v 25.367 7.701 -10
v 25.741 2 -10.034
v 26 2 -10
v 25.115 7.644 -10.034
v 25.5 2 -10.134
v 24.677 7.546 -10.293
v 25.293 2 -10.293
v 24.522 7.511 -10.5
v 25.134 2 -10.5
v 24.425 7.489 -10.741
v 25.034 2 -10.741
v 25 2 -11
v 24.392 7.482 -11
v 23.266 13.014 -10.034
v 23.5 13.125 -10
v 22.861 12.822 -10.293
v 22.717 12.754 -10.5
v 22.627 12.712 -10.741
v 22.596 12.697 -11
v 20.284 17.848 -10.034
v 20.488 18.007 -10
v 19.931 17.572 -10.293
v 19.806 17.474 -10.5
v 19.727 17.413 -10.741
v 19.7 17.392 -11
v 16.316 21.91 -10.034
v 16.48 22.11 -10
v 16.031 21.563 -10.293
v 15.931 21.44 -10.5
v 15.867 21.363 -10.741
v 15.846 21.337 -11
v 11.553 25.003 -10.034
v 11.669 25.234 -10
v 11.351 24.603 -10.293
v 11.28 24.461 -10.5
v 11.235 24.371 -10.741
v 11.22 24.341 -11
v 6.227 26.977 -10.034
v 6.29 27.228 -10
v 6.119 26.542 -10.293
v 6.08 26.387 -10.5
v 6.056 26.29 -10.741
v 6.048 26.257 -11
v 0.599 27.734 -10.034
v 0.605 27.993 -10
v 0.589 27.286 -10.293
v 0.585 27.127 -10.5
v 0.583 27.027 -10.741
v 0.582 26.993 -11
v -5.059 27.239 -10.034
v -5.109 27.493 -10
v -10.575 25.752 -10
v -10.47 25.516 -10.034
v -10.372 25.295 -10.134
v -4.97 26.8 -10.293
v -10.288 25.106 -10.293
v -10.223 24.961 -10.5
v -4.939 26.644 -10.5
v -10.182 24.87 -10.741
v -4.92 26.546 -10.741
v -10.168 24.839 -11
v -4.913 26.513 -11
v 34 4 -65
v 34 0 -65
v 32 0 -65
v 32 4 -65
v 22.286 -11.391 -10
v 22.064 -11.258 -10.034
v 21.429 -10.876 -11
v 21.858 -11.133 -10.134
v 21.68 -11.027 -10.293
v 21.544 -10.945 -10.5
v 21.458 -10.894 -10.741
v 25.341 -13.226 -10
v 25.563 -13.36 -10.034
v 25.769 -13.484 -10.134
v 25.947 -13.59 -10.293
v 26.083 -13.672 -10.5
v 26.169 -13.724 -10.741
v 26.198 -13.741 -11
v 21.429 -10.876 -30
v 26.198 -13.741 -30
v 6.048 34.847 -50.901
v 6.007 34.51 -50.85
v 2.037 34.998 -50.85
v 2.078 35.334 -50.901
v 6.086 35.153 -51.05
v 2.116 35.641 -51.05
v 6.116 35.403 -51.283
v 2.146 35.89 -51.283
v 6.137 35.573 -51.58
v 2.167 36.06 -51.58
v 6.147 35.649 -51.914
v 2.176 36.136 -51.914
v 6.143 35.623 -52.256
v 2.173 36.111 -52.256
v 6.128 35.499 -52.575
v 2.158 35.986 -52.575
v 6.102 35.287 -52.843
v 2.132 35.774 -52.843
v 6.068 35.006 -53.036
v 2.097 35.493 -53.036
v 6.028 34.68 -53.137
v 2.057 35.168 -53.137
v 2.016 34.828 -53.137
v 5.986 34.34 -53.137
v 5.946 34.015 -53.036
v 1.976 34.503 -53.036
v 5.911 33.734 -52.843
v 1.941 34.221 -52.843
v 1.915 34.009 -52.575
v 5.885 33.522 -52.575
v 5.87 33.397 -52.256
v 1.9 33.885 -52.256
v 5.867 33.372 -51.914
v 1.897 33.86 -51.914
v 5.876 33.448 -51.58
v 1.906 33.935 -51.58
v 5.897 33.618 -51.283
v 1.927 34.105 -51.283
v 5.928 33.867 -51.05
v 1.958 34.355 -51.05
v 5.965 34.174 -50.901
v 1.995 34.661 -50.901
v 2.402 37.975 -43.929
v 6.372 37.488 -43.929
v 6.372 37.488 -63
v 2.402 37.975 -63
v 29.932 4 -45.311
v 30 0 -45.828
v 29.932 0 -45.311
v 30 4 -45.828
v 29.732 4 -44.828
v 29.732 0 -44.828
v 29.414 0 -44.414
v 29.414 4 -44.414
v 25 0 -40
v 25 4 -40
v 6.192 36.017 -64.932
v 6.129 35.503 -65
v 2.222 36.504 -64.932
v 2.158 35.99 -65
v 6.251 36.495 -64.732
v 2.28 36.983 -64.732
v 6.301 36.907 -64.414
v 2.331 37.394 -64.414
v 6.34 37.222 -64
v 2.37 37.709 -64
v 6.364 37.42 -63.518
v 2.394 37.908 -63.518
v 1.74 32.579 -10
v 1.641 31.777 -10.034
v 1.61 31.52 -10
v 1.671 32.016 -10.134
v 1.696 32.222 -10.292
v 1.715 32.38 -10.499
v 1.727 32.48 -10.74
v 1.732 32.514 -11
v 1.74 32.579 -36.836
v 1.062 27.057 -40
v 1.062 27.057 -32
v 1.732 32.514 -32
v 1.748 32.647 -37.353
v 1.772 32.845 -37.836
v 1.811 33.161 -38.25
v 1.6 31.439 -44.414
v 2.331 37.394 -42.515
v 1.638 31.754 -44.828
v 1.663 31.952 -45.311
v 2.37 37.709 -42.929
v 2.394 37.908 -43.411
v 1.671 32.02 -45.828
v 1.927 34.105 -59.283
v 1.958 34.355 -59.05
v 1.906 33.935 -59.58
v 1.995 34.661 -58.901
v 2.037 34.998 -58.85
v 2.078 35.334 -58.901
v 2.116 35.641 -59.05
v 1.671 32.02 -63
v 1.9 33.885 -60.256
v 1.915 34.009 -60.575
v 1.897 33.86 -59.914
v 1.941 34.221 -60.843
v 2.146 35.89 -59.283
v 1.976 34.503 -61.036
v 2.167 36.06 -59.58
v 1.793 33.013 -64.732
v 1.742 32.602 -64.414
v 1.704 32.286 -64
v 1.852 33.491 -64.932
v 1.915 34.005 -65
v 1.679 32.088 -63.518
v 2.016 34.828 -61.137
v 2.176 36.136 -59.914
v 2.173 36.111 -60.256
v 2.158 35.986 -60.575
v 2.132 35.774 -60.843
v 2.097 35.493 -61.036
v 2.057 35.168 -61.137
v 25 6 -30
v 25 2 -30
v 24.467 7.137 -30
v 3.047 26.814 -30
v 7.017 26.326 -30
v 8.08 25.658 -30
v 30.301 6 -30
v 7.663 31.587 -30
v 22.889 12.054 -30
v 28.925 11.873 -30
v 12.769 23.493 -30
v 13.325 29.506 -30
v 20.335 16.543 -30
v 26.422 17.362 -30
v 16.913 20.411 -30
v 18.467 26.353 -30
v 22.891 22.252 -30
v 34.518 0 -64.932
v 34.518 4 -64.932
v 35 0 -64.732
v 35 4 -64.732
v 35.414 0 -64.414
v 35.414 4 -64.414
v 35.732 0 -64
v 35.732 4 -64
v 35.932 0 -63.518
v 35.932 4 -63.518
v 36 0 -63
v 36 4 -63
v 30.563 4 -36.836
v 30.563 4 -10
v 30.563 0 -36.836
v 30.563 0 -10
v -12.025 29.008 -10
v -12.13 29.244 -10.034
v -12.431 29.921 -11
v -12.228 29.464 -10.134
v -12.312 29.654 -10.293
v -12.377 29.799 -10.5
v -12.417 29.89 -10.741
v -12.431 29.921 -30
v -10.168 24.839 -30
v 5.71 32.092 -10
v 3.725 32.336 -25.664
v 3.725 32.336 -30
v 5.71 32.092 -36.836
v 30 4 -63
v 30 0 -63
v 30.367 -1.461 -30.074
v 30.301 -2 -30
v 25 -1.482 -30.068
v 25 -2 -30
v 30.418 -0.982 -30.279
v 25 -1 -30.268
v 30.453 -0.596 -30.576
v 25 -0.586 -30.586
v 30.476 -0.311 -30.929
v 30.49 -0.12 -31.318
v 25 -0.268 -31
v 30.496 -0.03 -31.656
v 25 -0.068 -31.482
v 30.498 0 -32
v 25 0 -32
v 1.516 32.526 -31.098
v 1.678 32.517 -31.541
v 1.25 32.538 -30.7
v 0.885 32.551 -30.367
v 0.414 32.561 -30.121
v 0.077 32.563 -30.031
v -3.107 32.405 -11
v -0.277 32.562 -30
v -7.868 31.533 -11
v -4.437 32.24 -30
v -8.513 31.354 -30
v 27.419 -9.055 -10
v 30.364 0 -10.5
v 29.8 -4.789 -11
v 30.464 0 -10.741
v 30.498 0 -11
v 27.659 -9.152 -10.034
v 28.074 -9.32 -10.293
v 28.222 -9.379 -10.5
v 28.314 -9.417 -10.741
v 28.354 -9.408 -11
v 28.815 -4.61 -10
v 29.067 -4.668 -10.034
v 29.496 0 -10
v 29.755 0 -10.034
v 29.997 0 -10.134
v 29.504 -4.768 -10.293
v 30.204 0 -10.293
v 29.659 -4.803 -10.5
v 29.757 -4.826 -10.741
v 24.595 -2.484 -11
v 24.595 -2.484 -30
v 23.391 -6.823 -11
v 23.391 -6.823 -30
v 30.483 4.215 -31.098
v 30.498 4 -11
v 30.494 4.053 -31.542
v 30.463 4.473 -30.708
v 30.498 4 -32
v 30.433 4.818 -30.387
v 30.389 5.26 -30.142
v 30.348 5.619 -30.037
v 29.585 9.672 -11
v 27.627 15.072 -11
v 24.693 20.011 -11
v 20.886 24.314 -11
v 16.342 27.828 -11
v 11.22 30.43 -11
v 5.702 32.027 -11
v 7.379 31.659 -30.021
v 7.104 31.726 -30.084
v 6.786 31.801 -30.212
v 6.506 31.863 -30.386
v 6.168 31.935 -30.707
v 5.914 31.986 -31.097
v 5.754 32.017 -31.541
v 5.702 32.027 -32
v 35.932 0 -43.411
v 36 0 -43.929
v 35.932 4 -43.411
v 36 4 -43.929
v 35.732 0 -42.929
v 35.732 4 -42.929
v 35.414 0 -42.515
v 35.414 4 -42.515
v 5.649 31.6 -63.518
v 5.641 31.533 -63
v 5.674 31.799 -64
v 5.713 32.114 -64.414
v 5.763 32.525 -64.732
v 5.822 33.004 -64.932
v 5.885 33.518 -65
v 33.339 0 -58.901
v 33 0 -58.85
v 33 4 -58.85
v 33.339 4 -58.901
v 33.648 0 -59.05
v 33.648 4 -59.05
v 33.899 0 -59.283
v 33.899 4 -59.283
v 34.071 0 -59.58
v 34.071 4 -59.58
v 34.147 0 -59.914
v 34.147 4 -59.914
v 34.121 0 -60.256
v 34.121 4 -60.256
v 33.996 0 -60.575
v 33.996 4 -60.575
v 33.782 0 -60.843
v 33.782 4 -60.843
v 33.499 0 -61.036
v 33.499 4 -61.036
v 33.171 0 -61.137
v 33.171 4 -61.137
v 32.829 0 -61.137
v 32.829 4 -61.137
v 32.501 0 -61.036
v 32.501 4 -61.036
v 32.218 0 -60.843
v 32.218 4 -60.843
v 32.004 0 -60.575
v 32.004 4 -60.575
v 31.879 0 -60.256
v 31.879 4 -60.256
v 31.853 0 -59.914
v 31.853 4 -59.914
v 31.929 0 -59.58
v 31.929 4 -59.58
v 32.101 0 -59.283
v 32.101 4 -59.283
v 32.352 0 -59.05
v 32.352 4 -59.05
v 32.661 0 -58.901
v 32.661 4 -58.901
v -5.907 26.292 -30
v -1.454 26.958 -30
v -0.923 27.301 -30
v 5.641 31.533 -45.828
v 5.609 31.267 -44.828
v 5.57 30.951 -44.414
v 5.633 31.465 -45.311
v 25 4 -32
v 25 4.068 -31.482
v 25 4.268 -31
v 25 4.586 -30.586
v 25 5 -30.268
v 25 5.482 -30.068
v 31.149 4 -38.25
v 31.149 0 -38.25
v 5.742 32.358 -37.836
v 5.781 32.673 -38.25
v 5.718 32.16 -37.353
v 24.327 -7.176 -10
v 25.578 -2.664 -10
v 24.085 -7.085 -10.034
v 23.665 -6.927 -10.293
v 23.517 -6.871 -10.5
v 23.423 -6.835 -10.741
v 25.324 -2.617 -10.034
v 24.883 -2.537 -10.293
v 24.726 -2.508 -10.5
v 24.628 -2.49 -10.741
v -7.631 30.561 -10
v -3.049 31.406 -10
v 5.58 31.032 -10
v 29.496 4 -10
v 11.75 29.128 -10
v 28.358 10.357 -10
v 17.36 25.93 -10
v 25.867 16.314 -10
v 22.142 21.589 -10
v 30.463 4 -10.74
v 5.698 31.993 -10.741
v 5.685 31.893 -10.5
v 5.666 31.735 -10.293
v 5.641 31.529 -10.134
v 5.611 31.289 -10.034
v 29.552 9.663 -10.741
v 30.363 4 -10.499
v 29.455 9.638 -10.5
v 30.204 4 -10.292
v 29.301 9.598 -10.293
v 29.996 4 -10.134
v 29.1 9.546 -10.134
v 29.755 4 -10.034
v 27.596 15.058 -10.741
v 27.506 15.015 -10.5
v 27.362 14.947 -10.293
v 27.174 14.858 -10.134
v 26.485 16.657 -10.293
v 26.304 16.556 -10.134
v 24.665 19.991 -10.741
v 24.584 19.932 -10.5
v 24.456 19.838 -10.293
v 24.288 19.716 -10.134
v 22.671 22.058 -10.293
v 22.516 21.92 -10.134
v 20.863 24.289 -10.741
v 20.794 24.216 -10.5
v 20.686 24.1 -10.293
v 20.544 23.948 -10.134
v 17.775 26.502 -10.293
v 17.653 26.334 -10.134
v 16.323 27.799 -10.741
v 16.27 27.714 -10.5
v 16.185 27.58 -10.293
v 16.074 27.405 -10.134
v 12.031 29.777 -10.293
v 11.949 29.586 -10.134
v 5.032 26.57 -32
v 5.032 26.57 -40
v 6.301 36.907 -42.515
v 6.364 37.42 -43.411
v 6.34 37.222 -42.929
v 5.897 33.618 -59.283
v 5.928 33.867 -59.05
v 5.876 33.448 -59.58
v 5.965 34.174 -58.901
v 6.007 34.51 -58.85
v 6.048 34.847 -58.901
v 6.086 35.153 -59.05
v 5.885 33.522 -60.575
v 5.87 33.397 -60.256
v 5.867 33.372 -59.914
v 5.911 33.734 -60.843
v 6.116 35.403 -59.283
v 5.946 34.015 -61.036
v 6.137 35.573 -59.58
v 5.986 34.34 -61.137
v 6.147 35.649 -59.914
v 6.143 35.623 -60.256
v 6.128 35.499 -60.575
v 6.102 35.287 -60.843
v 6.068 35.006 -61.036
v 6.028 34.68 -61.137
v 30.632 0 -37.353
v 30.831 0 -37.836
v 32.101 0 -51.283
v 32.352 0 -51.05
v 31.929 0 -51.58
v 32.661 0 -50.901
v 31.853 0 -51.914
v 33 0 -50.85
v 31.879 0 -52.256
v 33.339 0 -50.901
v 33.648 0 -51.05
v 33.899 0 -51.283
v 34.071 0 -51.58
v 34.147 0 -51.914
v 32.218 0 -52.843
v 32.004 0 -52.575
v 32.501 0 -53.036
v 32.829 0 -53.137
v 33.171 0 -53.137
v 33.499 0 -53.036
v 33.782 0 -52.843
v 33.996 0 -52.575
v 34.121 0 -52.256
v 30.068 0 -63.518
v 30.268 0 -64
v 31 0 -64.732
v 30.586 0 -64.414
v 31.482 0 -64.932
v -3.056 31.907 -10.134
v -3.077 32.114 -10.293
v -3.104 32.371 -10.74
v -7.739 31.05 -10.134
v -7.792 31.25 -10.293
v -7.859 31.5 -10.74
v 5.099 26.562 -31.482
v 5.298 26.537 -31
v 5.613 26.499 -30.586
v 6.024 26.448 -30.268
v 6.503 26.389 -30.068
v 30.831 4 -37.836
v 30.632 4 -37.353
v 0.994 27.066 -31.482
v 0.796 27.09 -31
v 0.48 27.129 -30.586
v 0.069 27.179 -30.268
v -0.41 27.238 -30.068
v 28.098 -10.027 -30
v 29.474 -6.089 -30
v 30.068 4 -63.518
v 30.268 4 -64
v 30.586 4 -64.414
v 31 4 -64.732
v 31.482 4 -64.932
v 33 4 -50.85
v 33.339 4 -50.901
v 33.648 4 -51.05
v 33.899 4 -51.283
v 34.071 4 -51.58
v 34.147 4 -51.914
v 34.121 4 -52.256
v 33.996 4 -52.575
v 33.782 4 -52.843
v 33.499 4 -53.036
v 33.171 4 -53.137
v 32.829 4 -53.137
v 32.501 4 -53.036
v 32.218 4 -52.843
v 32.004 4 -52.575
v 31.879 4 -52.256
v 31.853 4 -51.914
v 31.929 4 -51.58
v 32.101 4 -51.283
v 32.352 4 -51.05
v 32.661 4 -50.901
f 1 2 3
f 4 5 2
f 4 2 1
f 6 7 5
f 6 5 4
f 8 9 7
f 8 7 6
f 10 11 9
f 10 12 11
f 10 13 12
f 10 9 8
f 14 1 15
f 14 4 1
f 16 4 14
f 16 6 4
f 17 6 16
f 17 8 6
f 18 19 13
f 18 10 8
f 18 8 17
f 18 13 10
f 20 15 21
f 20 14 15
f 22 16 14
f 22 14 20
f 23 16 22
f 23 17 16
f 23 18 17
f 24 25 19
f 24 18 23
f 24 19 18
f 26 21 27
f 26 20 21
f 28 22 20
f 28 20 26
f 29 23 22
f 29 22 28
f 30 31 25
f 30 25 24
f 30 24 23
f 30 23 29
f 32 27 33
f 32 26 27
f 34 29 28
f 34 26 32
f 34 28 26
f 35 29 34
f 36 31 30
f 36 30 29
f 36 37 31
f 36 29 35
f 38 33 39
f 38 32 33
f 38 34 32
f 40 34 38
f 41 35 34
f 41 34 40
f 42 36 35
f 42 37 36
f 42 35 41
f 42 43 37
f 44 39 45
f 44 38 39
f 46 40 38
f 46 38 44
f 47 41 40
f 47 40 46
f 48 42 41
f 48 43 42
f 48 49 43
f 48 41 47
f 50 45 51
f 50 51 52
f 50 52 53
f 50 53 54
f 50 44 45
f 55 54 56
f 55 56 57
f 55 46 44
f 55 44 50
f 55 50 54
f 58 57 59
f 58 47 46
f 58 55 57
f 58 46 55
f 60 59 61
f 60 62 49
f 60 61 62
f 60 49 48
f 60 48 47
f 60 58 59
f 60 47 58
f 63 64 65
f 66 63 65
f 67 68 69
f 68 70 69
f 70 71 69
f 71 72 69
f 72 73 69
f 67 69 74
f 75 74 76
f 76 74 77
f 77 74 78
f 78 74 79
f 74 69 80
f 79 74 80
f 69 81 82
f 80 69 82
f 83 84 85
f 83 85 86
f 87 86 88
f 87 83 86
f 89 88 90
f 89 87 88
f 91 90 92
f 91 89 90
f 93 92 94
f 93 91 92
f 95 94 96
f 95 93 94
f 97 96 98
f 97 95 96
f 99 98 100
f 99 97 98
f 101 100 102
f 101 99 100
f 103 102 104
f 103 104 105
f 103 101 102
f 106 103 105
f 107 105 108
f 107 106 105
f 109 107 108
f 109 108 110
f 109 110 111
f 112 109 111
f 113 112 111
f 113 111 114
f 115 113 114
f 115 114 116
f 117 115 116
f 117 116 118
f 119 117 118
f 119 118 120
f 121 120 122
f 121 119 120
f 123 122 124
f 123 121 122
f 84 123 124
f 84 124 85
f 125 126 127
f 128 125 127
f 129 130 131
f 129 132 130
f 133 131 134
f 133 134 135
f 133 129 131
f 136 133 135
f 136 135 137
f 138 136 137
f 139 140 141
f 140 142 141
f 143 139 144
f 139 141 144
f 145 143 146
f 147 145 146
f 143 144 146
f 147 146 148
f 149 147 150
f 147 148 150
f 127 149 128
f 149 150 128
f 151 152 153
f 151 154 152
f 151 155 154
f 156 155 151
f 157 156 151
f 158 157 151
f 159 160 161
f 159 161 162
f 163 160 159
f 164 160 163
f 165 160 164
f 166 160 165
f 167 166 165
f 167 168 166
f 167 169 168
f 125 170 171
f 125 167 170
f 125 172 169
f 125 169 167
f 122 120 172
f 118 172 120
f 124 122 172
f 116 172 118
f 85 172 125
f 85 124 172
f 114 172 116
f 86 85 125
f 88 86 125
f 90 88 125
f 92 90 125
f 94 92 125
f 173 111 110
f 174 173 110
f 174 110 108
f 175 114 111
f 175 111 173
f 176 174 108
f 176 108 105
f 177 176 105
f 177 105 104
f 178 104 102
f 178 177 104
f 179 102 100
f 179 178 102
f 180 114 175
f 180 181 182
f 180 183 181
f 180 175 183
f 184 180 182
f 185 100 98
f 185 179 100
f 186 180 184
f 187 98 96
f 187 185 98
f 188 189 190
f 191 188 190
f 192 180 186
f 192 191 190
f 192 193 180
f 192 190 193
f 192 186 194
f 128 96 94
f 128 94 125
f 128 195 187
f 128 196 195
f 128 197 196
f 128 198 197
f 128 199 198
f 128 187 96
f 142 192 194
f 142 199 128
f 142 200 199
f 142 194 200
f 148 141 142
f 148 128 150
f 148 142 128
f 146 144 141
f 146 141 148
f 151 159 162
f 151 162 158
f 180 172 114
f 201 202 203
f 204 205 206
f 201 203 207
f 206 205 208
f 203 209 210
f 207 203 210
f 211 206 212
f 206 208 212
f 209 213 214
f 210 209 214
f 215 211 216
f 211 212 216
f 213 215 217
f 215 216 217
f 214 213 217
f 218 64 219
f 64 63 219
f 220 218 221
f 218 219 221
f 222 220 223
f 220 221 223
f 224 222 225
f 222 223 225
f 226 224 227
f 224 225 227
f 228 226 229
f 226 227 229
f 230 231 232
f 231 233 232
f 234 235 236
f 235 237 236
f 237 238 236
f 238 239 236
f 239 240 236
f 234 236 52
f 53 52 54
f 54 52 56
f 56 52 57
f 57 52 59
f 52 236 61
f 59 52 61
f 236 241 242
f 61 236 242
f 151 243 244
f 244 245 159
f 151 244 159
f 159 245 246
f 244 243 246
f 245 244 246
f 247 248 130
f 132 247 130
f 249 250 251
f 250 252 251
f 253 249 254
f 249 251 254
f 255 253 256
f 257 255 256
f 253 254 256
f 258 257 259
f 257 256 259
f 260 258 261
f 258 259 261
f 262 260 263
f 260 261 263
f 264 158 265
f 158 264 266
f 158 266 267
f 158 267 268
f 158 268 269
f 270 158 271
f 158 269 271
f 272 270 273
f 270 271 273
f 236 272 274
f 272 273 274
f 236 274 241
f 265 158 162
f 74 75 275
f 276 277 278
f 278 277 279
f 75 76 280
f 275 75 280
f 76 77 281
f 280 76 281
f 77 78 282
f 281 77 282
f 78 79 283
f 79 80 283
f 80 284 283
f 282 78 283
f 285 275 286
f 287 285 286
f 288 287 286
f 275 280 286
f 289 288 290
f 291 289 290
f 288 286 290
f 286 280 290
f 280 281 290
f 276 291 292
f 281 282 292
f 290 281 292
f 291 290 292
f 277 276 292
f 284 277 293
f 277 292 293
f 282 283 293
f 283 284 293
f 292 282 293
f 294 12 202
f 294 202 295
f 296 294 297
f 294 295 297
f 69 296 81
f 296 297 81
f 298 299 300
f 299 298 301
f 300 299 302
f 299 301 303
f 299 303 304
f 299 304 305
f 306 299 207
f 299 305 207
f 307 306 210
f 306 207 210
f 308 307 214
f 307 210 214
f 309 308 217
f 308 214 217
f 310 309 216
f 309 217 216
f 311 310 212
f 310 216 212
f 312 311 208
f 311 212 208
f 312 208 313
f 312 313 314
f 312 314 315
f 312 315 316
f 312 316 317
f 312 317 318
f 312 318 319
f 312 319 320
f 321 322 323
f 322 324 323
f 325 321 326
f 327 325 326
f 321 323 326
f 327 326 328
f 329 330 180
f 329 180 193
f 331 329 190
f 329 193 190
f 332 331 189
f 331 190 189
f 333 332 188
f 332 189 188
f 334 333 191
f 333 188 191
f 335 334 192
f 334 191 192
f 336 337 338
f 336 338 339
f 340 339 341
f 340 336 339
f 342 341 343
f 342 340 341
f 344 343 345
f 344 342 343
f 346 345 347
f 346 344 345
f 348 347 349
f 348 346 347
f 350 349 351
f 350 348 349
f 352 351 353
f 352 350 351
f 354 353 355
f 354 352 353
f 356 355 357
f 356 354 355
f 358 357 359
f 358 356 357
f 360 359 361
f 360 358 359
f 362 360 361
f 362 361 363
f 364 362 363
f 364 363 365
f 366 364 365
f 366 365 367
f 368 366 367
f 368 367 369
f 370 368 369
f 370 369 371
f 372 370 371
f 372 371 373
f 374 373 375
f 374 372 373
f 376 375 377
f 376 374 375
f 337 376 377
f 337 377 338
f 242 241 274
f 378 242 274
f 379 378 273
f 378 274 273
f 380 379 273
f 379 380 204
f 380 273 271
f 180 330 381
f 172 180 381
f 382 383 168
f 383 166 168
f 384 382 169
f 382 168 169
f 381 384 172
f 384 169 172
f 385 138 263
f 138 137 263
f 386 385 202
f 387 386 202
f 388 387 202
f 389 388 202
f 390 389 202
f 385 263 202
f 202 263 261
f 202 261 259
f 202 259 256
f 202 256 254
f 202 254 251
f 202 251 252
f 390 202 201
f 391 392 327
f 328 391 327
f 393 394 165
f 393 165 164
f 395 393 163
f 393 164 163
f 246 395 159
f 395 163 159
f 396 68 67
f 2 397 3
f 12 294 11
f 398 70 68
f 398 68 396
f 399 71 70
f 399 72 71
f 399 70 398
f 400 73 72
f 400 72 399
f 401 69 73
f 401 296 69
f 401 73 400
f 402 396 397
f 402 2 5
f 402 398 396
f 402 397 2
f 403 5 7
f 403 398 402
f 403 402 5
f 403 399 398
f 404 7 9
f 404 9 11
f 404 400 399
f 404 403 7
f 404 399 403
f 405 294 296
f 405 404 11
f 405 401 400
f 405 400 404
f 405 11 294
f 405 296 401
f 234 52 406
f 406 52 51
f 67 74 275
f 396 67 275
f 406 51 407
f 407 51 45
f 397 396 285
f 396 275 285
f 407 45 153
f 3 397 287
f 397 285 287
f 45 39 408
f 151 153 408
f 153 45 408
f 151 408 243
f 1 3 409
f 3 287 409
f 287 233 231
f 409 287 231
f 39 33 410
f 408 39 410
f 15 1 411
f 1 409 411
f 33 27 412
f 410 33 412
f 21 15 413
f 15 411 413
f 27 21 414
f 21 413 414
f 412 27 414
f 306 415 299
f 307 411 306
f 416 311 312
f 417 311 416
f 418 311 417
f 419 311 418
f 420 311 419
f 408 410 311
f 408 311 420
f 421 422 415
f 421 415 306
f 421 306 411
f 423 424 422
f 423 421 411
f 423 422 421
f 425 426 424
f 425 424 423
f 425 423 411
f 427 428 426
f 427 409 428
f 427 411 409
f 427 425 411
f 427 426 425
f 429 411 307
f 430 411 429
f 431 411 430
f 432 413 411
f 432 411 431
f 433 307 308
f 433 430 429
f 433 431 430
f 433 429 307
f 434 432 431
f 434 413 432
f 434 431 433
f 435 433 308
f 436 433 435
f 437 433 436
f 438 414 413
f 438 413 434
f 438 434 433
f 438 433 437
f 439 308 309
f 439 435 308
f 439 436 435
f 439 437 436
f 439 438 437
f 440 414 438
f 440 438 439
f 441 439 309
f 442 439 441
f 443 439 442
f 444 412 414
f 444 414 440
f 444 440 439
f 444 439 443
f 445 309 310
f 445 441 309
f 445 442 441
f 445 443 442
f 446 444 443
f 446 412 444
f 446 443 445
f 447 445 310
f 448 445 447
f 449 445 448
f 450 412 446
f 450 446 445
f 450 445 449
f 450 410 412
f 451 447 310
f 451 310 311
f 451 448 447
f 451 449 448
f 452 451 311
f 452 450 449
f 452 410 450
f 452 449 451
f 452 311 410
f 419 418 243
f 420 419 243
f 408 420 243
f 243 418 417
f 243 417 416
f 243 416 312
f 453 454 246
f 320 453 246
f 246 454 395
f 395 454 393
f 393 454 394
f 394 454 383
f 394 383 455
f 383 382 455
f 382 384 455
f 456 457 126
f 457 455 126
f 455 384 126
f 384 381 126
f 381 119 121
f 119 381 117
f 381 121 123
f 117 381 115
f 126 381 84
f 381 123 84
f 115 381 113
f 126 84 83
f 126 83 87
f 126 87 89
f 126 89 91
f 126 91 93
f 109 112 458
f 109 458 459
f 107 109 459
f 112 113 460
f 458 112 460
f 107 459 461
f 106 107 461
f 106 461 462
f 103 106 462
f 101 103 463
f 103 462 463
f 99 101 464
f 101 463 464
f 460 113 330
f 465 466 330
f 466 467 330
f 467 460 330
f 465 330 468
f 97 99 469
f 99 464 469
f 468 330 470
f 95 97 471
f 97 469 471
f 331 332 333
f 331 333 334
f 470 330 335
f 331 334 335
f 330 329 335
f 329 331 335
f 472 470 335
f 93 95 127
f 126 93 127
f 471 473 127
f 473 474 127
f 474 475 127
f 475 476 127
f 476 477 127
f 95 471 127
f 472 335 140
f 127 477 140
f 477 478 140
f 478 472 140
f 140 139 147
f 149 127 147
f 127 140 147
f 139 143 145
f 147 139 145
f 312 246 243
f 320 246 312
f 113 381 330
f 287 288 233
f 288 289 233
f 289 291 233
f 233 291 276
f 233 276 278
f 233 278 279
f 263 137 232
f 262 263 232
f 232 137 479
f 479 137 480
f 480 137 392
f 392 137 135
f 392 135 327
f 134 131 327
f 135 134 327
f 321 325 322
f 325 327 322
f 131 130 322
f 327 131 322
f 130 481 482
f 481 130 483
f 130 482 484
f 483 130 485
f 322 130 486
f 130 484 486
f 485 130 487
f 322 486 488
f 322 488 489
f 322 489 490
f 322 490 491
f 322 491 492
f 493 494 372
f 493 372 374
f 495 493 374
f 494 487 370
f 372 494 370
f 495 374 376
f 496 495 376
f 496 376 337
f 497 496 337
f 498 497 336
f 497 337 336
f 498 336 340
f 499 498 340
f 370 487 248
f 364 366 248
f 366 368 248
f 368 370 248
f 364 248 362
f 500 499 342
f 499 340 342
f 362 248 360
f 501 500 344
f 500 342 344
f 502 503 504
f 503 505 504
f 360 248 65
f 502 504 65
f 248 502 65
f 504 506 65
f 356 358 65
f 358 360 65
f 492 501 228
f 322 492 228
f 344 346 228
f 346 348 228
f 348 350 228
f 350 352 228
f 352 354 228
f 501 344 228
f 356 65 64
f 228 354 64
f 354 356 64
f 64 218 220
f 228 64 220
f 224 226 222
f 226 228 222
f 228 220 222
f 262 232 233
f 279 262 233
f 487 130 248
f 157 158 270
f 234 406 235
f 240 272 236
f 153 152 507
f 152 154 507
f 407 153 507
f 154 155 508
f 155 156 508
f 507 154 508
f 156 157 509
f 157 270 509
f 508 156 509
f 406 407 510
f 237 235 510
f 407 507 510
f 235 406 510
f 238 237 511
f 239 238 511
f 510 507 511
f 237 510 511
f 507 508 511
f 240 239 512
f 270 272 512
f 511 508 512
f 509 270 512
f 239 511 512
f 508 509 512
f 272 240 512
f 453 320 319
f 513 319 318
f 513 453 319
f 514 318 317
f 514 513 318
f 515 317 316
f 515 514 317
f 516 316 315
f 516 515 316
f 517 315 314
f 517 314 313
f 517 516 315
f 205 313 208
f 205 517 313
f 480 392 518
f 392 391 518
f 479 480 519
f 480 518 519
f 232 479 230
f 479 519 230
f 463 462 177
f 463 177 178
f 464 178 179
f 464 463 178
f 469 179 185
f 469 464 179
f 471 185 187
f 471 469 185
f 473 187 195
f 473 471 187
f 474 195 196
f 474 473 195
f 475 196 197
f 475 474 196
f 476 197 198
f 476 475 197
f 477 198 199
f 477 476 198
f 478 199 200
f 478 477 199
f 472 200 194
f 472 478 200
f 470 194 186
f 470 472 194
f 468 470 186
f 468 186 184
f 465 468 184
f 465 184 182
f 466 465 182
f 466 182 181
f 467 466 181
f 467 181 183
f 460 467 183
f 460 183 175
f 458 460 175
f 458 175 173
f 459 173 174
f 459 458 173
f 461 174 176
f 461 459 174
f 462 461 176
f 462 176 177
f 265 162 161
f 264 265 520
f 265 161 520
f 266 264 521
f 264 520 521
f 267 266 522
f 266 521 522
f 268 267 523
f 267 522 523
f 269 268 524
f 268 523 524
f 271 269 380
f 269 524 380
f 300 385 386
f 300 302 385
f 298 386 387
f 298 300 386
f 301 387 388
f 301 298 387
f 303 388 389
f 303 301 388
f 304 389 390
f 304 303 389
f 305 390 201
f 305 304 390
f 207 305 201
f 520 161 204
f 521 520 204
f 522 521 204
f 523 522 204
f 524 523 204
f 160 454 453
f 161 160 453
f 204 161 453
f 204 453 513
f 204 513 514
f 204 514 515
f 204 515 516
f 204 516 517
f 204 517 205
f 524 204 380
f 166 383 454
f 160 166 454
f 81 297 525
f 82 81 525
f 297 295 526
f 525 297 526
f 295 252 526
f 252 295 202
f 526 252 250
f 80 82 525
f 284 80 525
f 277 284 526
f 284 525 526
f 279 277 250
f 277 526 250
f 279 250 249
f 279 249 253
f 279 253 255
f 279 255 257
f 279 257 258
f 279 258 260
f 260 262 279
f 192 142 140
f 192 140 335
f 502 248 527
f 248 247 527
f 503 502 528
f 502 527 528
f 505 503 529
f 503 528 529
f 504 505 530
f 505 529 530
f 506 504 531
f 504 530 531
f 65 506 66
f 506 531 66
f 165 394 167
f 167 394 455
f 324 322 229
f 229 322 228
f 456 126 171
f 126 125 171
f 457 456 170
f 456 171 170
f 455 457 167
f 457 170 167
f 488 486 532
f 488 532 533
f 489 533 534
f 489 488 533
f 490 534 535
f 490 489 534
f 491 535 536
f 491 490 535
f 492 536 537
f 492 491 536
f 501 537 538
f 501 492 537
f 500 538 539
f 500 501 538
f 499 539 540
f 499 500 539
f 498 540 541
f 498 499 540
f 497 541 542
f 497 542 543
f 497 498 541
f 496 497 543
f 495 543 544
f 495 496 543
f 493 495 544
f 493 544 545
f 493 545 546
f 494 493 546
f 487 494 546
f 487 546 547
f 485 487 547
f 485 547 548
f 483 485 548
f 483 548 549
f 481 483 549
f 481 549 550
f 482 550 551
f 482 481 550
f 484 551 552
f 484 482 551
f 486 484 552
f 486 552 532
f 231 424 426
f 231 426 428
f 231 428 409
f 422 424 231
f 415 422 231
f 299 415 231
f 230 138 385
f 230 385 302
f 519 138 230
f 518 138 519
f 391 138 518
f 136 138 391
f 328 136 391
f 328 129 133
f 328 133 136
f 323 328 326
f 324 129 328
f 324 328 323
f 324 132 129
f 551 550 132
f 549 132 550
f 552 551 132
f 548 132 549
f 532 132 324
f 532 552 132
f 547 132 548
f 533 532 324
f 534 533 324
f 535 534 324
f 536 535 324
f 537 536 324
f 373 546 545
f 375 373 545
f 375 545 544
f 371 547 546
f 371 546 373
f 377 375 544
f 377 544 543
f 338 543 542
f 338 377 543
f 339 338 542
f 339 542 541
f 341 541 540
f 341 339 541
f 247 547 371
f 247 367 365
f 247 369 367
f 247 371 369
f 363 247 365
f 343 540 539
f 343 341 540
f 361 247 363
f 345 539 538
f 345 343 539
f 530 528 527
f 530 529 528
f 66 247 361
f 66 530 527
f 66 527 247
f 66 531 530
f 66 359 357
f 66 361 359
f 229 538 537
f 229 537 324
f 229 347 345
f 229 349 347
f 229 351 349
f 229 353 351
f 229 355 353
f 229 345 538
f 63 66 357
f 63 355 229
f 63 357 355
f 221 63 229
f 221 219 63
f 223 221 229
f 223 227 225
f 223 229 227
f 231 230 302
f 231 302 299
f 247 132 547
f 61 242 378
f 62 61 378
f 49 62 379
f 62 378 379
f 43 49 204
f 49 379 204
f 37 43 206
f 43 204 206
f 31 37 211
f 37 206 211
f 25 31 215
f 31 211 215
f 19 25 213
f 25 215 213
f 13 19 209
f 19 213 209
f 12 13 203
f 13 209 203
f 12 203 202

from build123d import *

# Parameters (mm, degrees)
SKETCH_1_R                       = 1.15
EXTRUDE_1_DEPTH                  = 4
FILLET_1_R                       = 2
SKETCH_2_W                       = 5.563454525
SKETCH_2_H                       = 20
REVOLVE_2_ANGLE                  = 114
REVOLVE_2_OTHER_WAY_ANGLE        = 31
PATTERN_CIRCULAR_4_COUNT         = 2
PATTERN_CIRCULAR_4_ANGLE         = 83
FILLET_1_OF_PATTERN_CIRCULAR_4_R = 2
FILLET_2_R                       = 1
FILLET_3_R                       = 2


with BuildPart() as part:
    # 草图1 → 凸台-拉伸1 (new body)
    with BuildSketch(Plane(origin=(0, 0, 0), x_dir=(1, 0, 0), z_dir=(0, 1, 0))):
        Polygon((25, 40), (25, 10), (30.563454525, 10), (30.563454525, 37.663959588), (36, 43.100505063), (36, 65), (30, 65), (30, 45), align=None)
        with Locations((33, 52)):
            Circle(SKETCH_1_R, mode=Mode.SUBTRACT)
        with Locations((33, 60)):
            Circle(SKETCH_1_R, mode=Mode.SUBTRACT)
    extrude_1 = extrude(amount=EXTRUDE_1_DEPTH)

    # 圆角1
    fillet_1_edges = [part.edges().sort_by_distance(p)[0] for p in [
        (30.563454525, 2, -37.663959588),
        (30, 2, -45),
        (36, 2, -43.100505063),
        (36, 2, -65),
        (30, 2, -65),
    ]]
    fillet(fillet_1_edges, radius=FILLET_1_R)

    # 草图2 → 旋转2 (revolve)
    with BuildSketch(Plane(origin=(0, 2, 0), x_dir=(1, 0, 0), z_dir=(0, 1, 0))):
        with Locations((27.781727262, 20)):
            Rectangle(SKETCH_2_W, SKETCH_2_H)
    revolve(axis=Axis((0, 2, -67.752835875), (0, 0, 1)), revolution_arc=REVOLVE_2_ANGLE)

    # 草图2 → 旋转2 other way (revolve)
    with BuildSketch(Plane(origin=(0, 2, 0), x_dir=(1, 0, 0), z_dir=(0, 1, 0))):
        with Locations((27.781727262, 20)):
            Rectangle(SKETCH_2_W, SKETCH_2_H)
    revolve(axis=Axis((0, 2, -67.752835875), (0, 0, -1)), revolution_arc=REVOLVE_2_OTHER_WAY_ANGLE)

    # 阵列(圆周)4: 凸台-拉伸1 ×2 about axis
    pattern_circular_4_axis = Axis((0, 2, -67.752835875), (0, 0, 1))
    for i in range(1, PATTERN_CIRCULAR_4_COUNT):
        add(extrude_1.rotate(pattern_circular_4_axis, i * PATTERN_CIRCULAR_4_ANGLE / (PATTERN_CIRCULAR_4_COUNT - 1)))

    # 圆角1 of 阵列(圆周)4
    fillet_1_of_pattern_circular_4_edges = [part.edges().sort_by_distance(p)[0] for p in [
        (3.724748135, 32.335639169, -37.663959588),
        (3.656080302, 31.776384549, -45),
        (4.387296363, 37.731661459, -43.100505063),
        (4.387296363, 37.731661459, -65),
        (3.656080302, 31.776384549, -65),
    ]]
    fillet(fillet_1_of_pattern_circular_4_edges, radius=FILLET_1_OF_PATTERN_CIRCULAR_4_R)

    # 圆角2
    fillet_2_edges = [part.edges().sort_by_distance(p)[0] for p in [
        (29.168708283, -7.127497445, -10),
        (22.890674113, 22.251957711, -10),
        (-5.504691137, 32.063651275, -10),
        (18.72389302, 18.565501205, -10),
    ]]
    fillet(fillet_2_edges, radius=FILLET_2_R)

    # 圆角3
    fillet_3_edges = [part.edges().sort_by_distance(p)[0] for p in [
        (5.366841465, 29.29839802, -30),
        (1.396656859, 29.785875394, -30),
        (27.748973347, 4, -30),
        (27.748973347, 0, -30),
    ]]
    fillet(fillet_3_edges, radius=FILLET_3_R)


solid = part.part
